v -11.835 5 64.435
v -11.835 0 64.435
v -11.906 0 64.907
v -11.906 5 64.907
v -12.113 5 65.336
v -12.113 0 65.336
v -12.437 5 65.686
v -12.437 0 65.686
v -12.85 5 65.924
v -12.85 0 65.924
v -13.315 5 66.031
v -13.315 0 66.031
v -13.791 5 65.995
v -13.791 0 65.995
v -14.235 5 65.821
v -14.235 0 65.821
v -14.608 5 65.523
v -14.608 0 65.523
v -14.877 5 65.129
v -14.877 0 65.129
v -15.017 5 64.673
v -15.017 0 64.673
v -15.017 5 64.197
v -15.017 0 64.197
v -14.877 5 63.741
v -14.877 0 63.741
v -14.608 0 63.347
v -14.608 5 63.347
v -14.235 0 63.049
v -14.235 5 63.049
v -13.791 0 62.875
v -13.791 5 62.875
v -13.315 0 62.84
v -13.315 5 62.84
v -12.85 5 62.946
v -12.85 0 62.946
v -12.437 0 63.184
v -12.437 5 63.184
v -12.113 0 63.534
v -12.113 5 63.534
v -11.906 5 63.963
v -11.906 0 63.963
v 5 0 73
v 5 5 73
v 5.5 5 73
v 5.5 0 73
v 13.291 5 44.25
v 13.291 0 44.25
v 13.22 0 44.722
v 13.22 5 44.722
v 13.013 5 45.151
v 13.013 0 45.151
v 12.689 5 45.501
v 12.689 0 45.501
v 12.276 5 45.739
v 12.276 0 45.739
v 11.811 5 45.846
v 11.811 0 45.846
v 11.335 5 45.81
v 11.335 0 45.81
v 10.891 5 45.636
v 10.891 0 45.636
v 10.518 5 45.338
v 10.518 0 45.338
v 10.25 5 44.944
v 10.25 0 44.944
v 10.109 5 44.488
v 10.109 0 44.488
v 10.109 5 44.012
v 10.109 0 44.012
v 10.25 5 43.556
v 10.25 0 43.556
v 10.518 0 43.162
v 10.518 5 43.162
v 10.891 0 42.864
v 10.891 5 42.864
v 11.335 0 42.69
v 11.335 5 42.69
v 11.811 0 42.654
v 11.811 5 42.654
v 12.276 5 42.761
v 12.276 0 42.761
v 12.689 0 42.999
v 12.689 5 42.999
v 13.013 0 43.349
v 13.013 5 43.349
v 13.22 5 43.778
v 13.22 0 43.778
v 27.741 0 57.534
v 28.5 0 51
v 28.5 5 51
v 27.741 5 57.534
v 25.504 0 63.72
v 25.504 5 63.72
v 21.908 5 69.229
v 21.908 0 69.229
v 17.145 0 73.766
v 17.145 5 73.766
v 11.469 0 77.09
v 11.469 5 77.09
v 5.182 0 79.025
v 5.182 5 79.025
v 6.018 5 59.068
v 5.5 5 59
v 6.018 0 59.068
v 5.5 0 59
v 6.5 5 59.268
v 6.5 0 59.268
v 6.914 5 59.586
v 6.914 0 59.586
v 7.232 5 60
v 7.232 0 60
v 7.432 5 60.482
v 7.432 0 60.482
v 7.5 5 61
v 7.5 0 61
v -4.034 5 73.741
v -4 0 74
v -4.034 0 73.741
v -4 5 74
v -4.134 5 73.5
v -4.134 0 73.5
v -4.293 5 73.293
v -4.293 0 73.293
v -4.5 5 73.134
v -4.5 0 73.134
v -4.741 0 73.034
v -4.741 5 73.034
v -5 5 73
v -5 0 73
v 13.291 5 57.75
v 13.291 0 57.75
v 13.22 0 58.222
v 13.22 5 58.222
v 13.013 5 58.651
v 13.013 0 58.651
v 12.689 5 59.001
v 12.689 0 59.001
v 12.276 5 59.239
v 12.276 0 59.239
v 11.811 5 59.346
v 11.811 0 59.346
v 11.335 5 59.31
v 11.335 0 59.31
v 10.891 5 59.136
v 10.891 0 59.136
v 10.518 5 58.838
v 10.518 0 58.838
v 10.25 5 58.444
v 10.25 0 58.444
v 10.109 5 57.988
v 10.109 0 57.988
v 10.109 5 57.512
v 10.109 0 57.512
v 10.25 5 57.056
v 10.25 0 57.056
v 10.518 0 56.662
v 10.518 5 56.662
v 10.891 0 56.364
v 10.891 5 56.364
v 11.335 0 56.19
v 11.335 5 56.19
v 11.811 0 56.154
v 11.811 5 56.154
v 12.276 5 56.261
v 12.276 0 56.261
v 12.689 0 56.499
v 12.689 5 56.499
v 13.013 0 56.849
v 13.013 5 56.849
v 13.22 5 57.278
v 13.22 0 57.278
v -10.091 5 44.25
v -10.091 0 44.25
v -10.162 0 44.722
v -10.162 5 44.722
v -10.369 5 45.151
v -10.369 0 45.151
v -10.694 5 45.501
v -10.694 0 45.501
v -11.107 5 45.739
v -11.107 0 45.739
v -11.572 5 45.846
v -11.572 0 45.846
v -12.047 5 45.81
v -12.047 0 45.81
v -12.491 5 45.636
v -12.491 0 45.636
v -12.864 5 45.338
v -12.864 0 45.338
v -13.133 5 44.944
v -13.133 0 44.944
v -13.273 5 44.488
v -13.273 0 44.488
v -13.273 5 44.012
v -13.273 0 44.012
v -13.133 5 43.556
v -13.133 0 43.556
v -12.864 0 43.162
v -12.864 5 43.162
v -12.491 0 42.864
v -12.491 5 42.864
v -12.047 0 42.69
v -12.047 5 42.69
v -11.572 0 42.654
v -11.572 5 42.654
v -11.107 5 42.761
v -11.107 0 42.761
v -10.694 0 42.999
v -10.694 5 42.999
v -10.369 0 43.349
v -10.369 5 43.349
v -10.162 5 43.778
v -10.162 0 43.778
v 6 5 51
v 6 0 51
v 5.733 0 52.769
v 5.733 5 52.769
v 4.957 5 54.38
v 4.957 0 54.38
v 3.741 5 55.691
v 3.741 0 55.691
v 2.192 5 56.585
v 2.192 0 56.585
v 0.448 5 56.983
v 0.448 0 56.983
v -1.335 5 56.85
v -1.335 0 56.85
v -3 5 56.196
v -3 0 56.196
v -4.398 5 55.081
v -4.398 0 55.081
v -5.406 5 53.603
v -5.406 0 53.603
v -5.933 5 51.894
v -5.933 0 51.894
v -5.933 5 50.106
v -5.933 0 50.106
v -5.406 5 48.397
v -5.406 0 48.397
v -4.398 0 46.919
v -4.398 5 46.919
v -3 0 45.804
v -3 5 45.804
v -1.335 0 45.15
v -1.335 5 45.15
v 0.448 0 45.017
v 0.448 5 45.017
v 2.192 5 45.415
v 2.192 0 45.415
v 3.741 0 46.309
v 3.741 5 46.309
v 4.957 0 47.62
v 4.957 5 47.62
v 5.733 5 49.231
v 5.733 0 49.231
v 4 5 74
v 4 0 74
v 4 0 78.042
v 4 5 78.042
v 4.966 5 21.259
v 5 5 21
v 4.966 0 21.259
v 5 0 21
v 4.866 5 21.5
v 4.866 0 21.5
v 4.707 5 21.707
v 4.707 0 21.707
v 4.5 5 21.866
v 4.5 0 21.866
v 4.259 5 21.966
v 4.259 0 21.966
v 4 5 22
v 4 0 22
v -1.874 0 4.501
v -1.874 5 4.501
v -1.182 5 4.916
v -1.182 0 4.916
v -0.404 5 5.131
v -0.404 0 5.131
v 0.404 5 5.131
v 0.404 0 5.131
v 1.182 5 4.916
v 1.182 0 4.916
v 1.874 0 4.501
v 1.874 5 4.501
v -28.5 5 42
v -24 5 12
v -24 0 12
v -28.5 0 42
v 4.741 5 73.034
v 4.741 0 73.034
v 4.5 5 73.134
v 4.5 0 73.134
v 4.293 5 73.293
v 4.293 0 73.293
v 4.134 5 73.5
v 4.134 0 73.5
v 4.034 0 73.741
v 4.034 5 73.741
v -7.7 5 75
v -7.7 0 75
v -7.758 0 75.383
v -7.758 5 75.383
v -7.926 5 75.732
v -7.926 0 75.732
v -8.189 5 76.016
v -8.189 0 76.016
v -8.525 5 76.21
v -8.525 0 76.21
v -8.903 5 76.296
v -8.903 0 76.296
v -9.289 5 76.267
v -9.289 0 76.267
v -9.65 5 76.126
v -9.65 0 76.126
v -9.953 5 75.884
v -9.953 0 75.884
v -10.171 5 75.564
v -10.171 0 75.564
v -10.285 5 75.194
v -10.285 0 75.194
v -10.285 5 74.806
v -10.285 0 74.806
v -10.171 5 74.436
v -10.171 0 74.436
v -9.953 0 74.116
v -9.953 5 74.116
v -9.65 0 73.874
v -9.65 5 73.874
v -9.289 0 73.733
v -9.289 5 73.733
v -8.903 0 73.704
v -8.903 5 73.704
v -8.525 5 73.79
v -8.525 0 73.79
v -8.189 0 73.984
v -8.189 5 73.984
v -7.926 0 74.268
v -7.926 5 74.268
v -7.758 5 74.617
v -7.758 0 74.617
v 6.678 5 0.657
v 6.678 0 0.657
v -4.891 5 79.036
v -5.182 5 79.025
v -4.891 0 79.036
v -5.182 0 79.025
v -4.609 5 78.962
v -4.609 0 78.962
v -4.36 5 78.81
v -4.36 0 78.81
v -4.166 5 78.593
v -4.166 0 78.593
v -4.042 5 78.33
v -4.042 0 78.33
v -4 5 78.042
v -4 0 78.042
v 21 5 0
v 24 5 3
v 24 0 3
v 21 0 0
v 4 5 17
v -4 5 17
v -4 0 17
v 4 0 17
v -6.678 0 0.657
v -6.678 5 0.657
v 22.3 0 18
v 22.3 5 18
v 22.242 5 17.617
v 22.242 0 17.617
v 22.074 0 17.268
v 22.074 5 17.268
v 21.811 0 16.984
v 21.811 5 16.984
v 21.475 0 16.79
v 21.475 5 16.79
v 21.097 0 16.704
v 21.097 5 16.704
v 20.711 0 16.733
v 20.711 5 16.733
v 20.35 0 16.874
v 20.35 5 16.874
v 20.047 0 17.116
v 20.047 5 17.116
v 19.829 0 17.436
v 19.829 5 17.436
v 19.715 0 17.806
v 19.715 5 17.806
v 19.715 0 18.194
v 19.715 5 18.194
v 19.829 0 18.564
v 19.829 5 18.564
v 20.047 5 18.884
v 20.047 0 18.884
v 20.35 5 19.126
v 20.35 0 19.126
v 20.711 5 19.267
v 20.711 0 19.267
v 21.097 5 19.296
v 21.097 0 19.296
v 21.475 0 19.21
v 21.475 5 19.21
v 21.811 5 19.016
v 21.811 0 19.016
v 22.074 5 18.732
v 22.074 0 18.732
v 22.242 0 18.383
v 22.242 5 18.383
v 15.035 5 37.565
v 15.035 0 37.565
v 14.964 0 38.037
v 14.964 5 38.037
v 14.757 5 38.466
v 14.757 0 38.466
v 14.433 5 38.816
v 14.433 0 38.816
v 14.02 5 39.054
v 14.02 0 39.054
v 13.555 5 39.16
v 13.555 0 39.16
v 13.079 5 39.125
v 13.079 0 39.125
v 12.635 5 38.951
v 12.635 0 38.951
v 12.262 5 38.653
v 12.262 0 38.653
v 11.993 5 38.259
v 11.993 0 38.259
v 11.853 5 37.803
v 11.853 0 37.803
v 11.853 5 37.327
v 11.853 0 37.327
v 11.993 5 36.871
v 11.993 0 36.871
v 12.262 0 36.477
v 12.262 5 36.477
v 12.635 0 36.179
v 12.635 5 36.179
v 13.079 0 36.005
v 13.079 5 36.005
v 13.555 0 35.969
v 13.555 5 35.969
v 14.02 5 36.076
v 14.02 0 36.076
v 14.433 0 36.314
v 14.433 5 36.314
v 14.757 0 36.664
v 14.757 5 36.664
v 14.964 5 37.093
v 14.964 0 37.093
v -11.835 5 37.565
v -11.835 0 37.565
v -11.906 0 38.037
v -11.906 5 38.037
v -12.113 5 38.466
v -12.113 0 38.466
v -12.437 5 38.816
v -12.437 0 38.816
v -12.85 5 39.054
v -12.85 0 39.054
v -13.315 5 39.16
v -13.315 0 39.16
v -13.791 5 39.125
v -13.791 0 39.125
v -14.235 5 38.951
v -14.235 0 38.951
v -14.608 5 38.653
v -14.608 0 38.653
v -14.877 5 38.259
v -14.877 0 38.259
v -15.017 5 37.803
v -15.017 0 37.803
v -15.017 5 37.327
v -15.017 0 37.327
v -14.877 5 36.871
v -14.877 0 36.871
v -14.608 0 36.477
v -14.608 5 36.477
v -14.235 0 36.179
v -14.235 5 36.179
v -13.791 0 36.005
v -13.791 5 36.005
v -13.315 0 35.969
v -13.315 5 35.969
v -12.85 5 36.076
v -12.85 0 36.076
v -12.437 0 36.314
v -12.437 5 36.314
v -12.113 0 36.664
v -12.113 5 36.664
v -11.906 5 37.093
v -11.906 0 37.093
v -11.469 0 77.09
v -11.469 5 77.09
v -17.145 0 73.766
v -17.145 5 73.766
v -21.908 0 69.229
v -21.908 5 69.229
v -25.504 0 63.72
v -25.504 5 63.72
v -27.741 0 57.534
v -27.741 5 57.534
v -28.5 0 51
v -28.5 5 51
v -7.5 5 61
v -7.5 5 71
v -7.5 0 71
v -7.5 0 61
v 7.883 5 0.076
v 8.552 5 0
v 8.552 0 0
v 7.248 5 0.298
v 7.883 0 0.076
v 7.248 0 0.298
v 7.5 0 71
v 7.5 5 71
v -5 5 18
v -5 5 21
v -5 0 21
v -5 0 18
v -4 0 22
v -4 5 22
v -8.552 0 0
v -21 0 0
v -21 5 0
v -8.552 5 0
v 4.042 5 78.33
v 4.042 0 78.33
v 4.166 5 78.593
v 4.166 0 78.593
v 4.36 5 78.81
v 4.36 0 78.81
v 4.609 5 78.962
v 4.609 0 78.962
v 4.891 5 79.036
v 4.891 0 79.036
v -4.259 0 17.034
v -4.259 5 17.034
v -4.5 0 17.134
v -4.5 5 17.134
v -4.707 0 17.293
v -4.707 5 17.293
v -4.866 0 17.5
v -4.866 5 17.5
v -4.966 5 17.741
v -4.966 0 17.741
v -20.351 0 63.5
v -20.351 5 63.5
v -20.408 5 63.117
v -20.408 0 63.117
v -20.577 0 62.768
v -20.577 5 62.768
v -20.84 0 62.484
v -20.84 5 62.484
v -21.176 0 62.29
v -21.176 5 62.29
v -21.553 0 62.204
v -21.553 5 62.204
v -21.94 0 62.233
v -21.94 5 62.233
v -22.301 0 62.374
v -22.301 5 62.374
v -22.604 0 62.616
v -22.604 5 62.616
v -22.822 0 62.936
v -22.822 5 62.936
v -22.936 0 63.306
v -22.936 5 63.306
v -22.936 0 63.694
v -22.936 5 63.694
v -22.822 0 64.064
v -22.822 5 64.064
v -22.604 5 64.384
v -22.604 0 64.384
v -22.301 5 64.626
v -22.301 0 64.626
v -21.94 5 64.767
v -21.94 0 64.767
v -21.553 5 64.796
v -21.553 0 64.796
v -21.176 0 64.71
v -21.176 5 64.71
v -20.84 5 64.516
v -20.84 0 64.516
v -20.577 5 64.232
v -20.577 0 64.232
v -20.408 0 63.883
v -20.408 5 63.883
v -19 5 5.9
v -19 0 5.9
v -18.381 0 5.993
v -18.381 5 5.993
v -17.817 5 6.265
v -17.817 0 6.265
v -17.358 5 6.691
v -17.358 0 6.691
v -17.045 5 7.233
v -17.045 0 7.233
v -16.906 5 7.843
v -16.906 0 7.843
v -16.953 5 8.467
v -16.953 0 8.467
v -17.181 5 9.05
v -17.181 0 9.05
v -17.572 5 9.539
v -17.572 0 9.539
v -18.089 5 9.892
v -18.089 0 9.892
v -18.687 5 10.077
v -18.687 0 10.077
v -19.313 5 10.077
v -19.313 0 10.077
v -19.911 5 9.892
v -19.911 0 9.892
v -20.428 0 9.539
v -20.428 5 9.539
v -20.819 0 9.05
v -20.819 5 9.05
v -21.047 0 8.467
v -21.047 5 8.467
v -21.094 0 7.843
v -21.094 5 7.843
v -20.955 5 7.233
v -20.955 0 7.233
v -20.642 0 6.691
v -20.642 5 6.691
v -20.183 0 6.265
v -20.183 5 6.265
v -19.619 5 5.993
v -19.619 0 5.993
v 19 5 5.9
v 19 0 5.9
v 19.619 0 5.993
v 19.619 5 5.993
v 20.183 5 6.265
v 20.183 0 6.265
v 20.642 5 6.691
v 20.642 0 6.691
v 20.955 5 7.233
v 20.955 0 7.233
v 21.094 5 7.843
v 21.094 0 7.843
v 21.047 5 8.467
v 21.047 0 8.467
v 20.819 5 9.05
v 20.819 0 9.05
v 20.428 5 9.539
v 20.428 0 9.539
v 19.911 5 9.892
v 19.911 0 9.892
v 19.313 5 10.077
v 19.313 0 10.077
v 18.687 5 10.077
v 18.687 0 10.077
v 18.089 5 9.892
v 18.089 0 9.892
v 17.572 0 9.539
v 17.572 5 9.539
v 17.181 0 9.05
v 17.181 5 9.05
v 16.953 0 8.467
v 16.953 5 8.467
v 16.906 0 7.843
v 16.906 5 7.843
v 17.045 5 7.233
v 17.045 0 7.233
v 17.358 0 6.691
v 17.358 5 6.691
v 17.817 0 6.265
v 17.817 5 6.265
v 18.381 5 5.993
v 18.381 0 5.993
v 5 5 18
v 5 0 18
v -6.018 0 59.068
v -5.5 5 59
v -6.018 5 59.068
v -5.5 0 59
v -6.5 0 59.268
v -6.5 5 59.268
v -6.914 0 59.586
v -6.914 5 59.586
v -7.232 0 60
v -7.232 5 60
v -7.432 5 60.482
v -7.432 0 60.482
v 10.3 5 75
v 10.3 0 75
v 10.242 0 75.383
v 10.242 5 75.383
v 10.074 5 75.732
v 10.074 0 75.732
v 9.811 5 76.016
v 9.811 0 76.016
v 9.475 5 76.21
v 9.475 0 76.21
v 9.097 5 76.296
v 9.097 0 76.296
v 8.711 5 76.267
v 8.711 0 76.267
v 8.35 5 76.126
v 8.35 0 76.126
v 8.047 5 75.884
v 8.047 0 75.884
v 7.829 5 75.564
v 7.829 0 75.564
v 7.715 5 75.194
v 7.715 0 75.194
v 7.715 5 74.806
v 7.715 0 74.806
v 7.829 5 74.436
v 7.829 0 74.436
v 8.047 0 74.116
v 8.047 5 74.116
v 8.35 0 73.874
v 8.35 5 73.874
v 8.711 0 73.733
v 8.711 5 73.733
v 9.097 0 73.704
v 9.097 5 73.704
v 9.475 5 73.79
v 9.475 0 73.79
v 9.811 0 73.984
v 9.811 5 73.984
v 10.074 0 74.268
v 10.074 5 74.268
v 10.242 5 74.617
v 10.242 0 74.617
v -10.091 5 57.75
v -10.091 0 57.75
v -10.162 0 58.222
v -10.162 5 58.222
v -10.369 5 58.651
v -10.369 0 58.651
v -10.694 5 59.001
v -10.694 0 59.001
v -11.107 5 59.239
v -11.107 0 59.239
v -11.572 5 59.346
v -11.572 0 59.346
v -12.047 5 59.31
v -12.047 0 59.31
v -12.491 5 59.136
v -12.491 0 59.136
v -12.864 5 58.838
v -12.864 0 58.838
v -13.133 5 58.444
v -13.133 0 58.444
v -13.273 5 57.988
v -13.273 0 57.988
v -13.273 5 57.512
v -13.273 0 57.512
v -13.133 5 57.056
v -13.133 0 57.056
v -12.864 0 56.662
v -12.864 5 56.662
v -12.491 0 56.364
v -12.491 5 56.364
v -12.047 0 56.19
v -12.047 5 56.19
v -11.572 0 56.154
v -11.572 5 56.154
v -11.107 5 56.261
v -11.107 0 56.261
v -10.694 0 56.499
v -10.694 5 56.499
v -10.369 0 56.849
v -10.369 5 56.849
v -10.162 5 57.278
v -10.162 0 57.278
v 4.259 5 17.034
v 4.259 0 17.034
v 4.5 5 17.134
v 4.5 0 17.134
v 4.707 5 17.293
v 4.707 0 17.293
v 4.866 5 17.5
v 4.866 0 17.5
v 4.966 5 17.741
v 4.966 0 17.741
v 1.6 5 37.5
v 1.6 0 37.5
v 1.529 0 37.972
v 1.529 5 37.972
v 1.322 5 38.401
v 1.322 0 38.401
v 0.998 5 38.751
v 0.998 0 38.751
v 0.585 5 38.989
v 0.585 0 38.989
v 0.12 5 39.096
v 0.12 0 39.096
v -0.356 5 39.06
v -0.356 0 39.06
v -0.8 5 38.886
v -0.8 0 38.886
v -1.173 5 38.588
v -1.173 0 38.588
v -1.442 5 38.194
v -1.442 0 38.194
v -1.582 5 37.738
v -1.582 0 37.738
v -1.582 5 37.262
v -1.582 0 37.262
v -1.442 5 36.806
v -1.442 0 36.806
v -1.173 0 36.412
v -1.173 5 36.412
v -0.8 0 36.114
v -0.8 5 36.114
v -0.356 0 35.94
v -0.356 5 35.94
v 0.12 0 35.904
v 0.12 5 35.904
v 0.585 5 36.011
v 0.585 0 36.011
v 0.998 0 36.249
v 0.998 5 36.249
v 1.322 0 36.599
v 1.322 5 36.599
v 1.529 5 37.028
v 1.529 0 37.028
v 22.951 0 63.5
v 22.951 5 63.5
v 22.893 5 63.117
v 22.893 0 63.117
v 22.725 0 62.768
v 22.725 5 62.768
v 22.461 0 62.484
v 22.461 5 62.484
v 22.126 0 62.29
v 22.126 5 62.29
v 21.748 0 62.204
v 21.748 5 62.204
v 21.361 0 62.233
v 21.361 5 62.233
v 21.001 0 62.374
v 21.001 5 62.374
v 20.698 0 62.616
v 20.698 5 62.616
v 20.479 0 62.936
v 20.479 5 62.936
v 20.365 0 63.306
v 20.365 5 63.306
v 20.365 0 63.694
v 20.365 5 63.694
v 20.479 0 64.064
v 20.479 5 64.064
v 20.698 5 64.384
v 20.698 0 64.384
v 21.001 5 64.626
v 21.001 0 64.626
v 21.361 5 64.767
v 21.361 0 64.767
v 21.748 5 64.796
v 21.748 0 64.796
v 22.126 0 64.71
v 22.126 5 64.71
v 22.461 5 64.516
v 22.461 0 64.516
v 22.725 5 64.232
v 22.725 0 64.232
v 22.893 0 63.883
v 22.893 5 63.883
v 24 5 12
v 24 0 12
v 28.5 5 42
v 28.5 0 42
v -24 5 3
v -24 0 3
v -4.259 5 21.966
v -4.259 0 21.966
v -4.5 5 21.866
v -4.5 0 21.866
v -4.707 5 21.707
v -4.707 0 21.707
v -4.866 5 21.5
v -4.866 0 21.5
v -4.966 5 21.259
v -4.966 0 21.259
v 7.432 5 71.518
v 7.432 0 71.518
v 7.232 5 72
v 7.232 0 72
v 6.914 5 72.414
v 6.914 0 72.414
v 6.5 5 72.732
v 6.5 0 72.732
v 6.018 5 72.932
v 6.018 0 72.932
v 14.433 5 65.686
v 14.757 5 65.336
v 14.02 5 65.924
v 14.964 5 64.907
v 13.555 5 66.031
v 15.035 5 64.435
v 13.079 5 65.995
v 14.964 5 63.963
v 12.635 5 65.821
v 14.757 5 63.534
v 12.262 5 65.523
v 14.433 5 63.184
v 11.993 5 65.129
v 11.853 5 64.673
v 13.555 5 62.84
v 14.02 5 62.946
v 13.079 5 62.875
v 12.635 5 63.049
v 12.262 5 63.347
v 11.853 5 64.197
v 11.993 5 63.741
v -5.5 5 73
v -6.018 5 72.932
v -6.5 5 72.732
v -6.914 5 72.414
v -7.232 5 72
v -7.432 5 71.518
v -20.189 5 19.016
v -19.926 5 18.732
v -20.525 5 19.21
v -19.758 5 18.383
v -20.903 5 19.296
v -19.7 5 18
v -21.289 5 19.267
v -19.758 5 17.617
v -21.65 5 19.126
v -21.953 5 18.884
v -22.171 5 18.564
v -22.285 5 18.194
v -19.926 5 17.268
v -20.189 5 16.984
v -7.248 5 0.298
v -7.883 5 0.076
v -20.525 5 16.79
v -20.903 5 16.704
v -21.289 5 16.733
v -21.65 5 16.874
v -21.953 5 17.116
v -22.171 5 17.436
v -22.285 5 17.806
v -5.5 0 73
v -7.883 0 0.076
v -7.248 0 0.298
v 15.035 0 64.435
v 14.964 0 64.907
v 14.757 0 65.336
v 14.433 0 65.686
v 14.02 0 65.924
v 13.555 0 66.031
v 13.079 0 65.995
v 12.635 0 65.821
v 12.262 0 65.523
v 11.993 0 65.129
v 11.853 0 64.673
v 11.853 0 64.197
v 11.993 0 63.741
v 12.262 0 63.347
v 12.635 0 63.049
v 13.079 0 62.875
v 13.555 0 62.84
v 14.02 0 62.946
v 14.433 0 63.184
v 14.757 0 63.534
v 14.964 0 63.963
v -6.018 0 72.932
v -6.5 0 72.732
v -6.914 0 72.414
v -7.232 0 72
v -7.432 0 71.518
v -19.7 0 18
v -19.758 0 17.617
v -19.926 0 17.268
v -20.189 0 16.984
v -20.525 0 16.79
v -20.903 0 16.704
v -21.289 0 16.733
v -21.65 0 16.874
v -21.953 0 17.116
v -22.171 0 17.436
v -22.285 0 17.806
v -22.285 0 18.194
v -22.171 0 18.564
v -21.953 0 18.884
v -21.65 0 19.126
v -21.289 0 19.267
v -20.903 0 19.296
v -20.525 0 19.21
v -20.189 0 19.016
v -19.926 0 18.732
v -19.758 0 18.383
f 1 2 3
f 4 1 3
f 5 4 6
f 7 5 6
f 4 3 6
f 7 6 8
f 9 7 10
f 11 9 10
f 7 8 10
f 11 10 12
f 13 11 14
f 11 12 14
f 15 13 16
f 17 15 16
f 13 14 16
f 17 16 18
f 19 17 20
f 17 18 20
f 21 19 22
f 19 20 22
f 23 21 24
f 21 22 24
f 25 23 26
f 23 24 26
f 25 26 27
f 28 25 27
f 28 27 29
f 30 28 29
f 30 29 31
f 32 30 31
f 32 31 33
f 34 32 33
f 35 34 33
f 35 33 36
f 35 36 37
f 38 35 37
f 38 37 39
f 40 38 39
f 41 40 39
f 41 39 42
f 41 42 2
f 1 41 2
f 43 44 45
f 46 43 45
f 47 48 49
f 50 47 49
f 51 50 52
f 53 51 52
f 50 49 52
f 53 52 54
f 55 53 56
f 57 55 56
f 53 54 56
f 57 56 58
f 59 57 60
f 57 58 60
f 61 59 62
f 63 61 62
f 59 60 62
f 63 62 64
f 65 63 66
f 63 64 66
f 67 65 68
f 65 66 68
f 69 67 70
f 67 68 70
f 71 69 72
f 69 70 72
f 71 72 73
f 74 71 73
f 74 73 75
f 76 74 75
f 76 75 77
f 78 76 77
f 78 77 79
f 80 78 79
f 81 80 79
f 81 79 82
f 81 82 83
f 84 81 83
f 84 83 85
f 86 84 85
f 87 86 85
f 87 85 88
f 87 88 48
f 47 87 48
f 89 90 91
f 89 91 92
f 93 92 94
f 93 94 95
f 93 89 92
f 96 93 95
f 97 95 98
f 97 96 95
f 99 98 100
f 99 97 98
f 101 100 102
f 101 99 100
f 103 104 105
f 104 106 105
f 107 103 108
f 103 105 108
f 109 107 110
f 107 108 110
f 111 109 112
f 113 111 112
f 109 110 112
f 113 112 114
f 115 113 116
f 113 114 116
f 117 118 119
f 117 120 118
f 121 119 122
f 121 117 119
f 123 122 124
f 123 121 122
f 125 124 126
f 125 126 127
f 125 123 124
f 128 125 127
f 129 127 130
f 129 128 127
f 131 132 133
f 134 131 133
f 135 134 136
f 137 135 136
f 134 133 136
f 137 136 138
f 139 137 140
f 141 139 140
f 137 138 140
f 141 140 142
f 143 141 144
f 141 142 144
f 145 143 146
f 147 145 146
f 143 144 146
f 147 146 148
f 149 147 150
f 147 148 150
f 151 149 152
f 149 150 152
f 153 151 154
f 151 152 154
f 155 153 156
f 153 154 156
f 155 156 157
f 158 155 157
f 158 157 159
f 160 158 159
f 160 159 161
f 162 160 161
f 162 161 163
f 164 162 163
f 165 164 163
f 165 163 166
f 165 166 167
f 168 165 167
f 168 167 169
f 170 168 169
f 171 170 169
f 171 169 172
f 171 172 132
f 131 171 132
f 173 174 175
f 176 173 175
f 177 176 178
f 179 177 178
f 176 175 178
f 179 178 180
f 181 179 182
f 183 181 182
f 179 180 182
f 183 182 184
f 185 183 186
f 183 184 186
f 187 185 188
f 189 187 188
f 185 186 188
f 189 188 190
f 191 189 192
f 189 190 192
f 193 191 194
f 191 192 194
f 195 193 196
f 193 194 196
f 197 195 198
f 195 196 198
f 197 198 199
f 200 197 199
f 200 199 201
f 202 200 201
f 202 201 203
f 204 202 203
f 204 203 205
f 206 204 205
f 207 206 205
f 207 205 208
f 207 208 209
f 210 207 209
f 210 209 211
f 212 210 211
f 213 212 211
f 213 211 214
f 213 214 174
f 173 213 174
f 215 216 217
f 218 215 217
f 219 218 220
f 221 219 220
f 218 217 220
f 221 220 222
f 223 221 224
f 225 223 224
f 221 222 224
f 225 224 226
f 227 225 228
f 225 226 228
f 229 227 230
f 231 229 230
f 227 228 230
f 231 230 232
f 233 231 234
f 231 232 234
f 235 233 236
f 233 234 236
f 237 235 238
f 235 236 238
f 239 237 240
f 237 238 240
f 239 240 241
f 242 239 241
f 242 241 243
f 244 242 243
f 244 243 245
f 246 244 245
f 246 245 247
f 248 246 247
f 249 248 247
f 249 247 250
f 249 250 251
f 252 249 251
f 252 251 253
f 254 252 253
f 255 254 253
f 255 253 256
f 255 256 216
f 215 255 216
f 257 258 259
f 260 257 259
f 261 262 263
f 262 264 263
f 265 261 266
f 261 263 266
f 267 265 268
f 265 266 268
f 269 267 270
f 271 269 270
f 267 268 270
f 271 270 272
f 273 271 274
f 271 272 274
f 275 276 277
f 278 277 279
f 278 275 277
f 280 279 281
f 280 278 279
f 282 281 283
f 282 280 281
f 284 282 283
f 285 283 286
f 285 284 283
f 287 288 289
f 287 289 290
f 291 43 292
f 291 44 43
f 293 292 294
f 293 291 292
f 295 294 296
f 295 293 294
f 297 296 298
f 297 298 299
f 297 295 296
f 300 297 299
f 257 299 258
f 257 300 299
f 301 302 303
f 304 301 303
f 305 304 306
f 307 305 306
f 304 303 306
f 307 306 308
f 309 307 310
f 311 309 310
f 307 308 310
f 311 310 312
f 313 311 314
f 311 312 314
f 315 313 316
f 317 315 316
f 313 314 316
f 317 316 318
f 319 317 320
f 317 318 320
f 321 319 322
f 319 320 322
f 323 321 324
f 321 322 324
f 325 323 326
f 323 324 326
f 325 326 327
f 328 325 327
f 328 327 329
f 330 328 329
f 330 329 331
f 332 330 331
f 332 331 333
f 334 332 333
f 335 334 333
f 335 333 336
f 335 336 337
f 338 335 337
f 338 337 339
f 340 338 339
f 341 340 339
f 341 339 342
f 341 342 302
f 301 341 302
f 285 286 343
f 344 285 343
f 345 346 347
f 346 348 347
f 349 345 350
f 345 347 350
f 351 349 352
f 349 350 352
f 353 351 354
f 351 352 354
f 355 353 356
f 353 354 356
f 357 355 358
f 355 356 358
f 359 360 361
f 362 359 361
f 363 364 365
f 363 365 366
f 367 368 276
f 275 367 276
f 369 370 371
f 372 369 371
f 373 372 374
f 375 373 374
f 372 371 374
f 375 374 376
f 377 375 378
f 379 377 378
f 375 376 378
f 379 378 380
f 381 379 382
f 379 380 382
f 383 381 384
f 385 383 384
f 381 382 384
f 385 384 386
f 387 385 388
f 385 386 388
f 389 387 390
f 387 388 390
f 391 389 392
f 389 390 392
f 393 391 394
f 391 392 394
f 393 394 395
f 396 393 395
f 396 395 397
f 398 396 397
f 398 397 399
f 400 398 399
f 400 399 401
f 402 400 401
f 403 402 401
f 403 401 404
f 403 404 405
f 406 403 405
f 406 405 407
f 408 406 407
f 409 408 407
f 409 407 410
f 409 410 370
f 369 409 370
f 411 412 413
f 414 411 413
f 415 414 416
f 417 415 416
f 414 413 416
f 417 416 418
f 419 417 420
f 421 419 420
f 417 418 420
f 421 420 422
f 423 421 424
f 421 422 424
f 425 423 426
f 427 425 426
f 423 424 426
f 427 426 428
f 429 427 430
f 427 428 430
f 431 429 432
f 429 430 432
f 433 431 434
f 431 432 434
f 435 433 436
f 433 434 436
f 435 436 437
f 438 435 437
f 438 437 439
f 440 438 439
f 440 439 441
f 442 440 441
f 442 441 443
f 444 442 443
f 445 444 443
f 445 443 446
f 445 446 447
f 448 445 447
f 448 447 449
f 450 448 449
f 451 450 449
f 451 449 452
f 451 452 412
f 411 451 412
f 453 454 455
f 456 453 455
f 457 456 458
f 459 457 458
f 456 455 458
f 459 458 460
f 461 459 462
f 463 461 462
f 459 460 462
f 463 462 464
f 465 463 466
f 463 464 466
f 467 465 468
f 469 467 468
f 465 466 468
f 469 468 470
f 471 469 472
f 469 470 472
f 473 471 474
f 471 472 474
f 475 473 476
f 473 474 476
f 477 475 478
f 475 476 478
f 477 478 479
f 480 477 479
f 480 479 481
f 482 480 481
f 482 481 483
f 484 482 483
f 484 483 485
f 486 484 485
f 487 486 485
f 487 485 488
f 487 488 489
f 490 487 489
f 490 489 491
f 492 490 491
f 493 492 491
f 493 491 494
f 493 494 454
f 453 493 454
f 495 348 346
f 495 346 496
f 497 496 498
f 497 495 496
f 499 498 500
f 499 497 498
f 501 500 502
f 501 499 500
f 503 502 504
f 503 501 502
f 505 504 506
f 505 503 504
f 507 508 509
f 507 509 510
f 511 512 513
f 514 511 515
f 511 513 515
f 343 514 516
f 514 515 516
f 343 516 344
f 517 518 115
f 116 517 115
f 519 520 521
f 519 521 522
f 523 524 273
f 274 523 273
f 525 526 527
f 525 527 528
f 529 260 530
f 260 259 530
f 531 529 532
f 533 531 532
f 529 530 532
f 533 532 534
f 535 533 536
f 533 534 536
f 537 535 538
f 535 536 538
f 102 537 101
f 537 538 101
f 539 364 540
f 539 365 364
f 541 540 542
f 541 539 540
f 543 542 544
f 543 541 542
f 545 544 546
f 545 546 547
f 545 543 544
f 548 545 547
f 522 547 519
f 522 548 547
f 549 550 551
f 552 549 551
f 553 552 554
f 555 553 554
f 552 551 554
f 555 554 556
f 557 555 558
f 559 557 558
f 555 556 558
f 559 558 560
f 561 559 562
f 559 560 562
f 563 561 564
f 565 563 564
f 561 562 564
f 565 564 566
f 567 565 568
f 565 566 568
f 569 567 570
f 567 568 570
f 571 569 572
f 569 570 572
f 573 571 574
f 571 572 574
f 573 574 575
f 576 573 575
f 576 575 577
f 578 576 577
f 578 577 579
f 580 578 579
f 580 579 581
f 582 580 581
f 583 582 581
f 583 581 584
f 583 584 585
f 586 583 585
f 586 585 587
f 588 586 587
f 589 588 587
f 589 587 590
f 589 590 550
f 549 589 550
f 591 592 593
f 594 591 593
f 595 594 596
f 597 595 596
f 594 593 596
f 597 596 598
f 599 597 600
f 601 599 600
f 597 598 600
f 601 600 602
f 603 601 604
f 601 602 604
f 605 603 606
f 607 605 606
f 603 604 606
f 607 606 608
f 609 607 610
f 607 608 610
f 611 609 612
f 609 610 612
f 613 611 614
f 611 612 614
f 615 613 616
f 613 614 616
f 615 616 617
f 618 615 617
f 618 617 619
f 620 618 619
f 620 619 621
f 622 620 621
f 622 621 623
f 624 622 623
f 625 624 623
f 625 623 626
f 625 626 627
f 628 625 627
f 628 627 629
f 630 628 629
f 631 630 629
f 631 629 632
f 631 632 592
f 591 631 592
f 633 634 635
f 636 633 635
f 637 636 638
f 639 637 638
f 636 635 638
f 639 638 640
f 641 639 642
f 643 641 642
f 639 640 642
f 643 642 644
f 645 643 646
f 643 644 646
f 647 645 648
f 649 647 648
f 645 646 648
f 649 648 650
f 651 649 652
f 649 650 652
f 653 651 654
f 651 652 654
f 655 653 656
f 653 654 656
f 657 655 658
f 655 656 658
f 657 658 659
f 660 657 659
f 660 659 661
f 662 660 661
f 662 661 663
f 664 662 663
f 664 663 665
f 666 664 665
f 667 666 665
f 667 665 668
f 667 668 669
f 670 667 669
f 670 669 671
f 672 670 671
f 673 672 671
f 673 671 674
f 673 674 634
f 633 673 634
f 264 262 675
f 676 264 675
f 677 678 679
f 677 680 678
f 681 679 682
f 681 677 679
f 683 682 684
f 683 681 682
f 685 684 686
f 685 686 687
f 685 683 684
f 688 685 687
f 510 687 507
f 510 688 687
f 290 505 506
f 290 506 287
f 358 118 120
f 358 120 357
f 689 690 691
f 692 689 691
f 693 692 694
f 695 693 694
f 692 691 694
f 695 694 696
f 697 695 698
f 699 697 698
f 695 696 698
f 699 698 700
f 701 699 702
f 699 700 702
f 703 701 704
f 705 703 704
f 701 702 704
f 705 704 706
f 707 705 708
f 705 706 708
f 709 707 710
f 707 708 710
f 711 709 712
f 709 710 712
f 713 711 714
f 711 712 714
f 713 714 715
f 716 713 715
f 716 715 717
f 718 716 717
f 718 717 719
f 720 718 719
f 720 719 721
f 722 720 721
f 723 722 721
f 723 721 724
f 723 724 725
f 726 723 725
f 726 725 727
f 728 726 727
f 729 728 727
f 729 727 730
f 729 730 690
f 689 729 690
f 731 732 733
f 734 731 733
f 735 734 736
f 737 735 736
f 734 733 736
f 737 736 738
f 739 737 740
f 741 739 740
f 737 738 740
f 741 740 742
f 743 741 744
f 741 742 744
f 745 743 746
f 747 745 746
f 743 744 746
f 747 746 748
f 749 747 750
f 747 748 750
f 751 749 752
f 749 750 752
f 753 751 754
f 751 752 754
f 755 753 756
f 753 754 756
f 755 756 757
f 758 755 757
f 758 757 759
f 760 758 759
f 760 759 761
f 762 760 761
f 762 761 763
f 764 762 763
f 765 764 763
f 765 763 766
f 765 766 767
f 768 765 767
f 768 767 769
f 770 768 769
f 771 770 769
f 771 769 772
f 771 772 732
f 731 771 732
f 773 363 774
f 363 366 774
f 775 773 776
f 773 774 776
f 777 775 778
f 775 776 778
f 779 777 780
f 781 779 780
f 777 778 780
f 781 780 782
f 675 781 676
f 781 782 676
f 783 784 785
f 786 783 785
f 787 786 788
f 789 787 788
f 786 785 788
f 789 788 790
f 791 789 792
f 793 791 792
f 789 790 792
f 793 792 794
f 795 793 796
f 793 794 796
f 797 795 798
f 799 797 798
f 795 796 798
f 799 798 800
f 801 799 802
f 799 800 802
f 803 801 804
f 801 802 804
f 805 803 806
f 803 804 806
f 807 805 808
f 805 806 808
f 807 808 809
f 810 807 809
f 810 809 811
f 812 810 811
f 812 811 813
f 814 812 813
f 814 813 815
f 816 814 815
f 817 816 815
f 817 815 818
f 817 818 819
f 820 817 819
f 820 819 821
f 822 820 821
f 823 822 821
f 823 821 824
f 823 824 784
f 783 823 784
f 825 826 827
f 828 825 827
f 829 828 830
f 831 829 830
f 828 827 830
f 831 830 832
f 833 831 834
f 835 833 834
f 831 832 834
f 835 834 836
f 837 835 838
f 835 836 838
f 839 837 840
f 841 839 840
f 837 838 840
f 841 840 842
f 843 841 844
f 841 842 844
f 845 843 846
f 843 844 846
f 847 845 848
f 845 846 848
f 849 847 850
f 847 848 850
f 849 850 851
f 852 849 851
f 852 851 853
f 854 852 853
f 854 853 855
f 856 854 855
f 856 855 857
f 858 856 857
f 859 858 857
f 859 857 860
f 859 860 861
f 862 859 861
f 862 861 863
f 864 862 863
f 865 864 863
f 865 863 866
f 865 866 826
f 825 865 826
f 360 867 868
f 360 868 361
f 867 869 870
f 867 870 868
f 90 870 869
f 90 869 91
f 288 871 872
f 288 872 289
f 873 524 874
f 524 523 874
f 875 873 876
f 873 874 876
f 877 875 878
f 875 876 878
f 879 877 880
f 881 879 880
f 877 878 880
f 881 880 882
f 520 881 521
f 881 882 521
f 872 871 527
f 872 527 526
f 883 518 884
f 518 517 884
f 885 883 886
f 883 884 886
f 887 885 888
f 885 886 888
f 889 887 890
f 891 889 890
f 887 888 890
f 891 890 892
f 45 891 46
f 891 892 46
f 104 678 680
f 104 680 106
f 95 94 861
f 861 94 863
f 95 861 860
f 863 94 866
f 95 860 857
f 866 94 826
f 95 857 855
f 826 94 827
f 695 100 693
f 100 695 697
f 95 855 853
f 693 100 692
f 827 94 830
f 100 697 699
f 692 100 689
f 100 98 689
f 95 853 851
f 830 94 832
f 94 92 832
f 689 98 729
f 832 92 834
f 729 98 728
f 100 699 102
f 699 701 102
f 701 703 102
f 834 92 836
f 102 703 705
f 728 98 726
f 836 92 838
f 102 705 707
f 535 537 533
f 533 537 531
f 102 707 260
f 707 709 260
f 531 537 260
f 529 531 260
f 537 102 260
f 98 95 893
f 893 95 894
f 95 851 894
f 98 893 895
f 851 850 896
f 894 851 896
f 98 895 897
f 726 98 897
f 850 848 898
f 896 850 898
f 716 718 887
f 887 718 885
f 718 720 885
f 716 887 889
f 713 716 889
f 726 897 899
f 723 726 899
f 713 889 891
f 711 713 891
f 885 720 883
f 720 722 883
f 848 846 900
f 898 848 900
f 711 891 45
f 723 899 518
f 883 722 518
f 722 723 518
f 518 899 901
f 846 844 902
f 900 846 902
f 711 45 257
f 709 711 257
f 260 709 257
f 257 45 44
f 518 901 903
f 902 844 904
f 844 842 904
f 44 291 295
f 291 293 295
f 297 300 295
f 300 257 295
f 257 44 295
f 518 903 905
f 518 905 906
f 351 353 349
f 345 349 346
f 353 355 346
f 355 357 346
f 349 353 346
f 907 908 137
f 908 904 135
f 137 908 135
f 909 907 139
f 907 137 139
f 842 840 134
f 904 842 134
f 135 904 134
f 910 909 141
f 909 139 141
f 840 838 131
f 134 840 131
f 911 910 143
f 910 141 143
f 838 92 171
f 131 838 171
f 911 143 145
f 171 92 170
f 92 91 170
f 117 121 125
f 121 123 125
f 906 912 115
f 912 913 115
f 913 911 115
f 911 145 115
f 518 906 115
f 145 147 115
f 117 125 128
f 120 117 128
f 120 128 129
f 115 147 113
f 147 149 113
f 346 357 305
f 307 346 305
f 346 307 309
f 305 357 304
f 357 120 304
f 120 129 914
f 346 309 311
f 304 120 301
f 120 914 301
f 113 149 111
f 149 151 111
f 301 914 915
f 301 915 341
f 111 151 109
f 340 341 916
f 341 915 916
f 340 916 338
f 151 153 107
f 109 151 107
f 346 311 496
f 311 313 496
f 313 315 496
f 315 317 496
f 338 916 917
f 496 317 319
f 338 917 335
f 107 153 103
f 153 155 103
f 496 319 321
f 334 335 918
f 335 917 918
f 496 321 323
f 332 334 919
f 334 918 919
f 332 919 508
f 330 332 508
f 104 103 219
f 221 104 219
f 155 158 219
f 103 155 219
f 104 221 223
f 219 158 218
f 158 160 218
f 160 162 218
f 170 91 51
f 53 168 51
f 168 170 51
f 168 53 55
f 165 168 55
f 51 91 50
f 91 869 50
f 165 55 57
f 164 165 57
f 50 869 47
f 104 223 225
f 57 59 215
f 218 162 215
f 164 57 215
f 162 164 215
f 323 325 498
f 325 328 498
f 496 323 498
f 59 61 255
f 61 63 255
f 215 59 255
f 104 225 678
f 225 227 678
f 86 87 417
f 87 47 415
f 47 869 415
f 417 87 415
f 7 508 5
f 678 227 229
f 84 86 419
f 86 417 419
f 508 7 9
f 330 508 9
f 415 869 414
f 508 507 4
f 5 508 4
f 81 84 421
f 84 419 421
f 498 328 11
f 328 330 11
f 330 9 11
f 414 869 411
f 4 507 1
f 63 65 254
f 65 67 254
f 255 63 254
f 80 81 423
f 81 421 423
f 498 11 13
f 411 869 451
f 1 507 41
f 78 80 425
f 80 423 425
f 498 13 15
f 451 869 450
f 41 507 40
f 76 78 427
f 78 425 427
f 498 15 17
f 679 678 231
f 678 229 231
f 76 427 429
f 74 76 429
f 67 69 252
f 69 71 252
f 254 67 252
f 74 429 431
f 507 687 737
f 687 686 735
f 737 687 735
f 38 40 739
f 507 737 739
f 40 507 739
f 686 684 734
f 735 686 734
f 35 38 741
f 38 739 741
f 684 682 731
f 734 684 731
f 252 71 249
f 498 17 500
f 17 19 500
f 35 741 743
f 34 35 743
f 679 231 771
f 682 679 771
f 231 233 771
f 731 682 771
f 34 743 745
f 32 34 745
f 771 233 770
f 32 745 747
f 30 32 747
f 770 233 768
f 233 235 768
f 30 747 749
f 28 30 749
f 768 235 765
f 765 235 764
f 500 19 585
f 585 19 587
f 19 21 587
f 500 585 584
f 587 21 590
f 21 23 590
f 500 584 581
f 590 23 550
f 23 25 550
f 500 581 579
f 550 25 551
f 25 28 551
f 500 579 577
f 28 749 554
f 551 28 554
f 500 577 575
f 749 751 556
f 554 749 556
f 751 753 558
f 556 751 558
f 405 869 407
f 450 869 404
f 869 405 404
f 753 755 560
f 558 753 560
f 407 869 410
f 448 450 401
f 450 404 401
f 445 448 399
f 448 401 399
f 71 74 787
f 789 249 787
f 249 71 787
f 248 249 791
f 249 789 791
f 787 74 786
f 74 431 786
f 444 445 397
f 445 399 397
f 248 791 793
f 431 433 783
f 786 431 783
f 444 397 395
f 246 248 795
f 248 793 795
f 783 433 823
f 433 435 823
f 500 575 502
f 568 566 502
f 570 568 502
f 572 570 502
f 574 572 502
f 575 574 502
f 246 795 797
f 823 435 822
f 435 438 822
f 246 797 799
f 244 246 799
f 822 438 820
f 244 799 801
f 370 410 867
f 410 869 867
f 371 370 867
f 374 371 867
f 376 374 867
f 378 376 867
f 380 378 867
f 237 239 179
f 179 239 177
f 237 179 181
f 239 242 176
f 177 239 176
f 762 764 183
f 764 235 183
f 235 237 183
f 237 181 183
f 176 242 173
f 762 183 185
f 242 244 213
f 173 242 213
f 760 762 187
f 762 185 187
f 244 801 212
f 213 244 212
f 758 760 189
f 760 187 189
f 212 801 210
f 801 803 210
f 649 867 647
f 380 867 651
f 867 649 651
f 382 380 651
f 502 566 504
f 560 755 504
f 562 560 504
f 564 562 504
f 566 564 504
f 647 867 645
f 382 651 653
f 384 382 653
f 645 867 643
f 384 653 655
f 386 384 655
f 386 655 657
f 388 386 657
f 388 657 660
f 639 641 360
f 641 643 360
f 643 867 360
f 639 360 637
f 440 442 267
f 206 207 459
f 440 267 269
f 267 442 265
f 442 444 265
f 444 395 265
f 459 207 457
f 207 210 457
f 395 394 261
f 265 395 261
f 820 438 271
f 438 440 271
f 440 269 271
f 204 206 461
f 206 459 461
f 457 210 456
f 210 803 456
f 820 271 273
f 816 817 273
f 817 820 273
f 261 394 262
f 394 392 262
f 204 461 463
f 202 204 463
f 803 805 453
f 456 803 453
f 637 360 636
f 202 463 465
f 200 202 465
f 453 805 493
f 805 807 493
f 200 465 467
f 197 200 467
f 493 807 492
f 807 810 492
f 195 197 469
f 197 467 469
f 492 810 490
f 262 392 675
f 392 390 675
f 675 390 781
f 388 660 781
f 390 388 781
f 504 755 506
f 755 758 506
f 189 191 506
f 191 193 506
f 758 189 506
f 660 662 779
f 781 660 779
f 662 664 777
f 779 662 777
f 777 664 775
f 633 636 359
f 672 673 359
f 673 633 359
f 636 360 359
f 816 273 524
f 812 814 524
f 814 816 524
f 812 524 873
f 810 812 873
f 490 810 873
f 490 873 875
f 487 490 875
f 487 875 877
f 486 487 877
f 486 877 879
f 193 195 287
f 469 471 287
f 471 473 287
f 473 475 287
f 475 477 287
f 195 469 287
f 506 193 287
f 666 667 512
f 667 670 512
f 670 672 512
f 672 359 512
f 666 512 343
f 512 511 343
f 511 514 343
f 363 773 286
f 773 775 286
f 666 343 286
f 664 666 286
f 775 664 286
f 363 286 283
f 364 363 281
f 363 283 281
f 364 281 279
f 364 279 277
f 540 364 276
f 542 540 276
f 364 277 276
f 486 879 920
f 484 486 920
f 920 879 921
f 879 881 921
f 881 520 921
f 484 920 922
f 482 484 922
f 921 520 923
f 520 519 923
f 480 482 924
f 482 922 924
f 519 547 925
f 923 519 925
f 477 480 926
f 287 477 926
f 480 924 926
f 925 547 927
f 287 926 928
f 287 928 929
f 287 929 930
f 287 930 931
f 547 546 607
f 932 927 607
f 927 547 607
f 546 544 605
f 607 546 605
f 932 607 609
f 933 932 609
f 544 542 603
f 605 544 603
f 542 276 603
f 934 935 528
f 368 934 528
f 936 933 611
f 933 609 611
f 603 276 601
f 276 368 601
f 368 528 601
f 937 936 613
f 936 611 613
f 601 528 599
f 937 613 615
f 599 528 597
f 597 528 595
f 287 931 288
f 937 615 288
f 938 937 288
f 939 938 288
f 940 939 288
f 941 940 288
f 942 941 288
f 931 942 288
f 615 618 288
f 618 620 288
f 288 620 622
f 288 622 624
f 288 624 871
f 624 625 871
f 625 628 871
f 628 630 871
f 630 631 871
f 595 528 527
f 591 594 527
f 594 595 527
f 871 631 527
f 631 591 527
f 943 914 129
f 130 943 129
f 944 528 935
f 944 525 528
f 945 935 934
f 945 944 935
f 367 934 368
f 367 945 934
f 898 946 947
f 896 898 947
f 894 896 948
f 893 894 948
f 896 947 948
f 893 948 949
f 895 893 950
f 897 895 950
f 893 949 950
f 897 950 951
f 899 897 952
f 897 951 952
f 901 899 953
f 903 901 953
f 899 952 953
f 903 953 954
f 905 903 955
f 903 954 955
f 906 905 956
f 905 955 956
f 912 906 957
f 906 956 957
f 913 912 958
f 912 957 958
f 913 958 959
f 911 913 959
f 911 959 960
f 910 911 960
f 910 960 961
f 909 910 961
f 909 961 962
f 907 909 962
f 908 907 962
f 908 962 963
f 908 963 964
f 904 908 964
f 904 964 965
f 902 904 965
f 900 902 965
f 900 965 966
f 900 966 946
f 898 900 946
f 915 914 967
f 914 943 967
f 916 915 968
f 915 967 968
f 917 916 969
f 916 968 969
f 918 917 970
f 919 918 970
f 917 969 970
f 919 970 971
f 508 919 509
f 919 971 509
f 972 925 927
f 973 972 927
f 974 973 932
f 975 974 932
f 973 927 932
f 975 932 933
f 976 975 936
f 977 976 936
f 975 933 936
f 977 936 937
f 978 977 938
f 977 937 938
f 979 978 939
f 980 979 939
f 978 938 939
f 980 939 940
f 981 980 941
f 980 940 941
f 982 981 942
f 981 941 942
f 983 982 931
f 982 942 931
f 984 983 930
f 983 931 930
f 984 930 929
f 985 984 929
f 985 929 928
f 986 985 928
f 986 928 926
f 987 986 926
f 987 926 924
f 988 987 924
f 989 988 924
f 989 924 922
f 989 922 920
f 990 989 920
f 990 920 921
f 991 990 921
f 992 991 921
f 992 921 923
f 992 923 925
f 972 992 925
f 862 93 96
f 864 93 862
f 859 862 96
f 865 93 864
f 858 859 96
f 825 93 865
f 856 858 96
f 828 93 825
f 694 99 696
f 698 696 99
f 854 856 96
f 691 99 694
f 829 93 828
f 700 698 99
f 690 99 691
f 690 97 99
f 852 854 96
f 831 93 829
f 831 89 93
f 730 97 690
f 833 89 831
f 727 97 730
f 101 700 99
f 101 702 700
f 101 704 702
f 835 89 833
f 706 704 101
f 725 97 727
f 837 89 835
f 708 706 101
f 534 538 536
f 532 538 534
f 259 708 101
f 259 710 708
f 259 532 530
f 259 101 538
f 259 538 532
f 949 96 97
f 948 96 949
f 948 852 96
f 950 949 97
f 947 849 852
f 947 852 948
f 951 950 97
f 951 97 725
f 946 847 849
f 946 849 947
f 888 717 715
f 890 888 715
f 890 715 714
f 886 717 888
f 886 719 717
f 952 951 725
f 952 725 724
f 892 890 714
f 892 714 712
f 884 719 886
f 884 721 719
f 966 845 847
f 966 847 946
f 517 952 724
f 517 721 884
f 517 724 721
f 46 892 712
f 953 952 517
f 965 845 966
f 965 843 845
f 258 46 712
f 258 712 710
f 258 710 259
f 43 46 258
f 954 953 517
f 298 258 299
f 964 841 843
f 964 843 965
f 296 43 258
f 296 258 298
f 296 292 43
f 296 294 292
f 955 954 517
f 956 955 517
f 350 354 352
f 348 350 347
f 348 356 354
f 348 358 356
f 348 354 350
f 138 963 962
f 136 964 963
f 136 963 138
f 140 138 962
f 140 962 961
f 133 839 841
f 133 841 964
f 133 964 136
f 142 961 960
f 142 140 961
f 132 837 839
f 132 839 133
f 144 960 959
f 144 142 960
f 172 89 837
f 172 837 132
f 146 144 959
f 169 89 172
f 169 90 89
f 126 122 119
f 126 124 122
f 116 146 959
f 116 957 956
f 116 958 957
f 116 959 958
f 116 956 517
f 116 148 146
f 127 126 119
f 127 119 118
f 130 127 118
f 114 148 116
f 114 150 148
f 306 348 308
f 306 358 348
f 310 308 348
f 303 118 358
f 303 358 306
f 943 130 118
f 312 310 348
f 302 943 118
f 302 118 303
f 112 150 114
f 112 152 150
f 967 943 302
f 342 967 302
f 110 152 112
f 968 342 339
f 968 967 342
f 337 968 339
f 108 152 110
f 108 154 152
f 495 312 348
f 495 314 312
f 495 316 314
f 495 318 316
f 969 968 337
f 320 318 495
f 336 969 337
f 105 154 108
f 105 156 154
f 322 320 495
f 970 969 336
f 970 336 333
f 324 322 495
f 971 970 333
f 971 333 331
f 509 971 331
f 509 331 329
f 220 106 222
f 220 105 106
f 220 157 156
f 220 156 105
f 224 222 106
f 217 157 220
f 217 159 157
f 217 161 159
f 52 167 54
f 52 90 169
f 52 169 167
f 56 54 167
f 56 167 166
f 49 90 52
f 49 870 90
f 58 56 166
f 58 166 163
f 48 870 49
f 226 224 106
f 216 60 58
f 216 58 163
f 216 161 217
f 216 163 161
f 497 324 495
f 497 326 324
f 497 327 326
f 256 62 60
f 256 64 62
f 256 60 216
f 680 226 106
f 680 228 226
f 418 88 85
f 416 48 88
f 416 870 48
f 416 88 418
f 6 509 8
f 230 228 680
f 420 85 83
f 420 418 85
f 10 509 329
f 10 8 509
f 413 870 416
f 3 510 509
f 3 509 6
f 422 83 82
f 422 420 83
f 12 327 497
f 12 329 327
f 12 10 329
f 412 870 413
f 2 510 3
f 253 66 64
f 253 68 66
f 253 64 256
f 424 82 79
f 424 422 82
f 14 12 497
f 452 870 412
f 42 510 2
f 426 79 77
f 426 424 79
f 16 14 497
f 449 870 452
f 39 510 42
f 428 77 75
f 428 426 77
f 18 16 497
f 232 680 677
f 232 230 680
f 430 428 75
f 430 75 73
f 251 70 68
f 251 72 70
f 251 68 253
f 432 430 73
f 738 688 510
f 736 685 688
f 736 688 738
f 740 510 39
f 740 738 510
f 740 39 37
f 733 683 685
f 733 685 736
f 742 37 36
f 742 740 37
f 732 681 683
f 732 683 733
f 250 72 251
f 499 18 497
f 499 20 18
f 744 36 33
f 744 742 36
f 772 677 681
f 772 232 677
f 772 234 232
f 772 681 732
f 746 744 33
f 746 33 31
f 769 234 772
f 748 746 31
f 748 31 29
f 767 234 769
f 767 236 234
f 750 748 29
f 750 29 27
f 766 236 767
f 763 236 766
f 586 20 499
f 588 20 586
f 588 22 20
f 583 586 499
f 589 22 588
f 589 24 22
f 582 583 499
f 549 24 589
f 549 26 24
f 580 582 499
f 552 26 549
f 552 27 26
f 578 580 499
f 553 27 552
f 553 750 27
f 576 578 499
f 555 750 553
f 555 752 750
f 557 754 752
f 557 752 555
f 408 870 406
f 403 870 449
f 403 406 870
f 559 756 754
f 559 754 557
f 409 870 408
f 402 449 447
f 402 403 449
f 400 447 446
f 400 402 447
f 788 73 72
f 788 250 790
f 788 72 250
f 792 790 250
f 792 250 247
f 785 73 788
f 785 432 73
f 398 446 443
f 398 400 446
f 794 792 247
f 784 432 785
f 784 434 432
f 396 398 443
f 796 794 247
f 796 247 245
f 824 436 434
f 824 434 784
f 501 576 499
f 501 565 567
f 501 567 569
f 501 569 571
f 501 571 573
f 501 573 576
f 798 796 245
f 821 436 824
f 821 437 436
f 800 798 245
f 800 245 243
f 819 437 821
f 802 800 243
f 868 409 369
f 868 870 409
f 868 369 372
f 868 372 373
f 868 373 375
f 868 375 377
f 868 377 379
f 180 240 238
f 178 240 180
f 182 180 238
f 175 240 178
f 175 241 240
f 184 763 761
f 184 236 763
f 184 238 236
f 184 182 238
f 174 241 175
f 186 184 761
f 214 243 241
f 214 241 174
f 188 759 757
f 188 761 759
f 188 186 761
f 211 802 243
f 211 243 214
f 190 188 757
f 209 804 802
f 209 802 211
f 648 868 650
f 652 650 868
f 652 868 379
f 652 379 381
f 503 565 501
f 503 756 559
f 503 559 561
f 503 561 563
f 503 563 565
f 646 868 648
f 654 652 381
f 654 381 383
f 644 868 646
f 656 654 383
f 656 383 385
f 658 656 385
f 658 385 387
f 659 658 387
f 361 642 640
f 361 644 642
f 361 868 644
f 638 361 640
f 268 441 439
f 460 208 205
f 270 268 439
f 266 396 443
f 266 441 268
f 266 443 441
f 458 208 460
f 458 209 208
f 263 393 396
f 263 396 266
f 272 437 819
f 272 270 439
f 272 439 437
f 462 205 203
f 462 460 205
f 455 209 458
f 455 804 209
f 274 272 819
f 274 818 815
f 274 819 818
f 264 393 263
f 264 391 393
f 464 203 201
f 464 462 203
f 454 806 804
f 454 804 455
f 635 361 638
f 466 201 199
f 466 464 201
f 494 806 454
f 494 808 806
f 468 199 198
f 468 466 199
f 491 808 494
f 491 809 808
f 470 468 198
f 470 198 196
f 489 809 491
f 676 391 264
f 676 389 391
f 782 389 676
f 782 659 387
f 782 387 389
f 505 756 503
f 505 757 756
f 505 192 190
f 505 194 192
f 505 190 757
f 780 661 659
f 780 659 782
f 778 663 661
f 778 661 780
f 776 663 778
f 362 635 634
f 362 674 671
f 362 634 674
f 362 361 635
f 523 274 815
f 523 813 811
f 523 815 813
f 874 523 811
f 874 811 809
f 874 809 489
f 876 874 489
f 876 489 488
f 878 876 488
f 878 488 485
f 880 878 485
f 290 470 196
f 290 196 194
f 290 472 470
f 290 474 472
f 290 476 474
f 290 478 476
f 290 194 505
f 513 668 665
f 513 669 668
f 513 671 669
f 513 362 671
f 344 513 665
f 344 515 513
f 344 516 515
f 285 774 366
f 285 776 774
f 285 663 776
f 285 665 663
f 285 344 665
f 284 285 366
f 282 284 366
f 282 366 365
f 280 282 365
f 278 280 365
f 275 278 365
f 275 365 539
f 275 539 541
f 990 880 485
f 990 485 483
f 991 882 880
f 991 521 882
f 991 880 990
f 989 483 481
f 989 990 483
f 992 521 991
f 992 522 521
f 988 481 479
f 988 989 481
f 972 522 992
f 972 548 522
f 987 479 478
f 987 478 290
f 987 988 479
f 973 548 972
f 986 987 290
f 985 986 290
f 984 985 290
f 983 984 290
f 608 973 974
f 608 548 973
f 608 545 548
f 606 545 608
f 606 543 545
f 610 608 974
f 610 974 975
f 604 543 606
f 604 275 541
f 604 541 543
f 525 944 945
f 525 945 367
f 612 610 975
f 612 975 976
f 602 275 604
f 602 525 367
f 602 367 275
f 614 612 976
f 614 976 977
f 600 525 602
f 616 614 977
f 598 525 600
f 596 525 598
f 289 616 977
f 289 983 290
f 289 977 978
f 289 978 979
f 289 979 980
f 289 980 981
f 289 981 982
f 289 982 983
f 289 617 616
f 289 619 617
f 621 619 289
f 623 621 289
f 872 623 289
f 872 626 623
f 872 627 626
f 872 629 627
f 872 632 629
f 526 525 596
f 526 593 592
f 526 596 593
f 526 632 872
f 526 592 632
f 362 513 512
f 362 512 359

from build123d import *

# Parameters (mm, degrees)
EXTRUDE_1_DEPTH        = 5
HOLE_WIZARD_M5_1_D     = 4.2
HOLE_WIZARD_M5_1_DEPTH = 5
SKETCH_4_R             = 1.6
CUT_EXTRUDE_1_DEPTH    = 10
SKETCH_5_R             = 1.6
CUT_EXTRUDE_2_DEPTH    = 10
SKETCH_6_R             = 6
CUT_EXTRUDE_3_DEPTH    = 10
CHAMFER_1_SIZE         = 2
CUT_EXTRUDE_4_DEPTH    = 6
CHAMFER_2_SIZE         = 3
SKETCH_8_R             = 1.3
CUT_EXTRUDE_5_DEPTH    = 6
SKETCH_9_R             = 1.3
CUT_EXTRUDE_6_DEPTH    = 6
CUT_EXTRUDE_8_DEPTH    = 10
FILLET_1_R             = 3
SKETCH_12_W            = 15
SKETCH_12_H            = 14
CUT_EXTRUDE_9_DEPTH    = 10
FILLET_2_R             = 2
SKETCH_13_W            = 8
SKETCH_13_H            = 6.5
CUT_EXTRUDE_10_DEPTH   = 10
FILLET_3_R             = 1
SKETCH_14_R            = 1.3
CUT_EXTRUDE_11_DEPTH   = 10
SKETCH_15_W            = 10
SKETCH_15_H            = 5
CUT_EXTRUDE_12_DEPTH   = 10
FILLET_4_R             = 1


with BuildPart() as part:
    # 草图1 → 凸台-拉伸1 (new body)
    with BuildSketch(Plane(origin=(0, 0, 0), x_dir=(1, 0, 0), z_dir=(0, 1, 0))):
        with BuildLine():
            Line((-28.5, 0), (28.5, 0))
            Line((28.5, 0), (28.5, -51))
            ThreePointArc((28.5, -51), (0, -79.5), (-28.5, -51))
            Line((-28.5, -51), (-28.5, 0))
        make_face()
    extrude(amount=EXTRUDE_1_DEPTH)

    # M5 螺纹孔1
    with Locations(Plane(origin=(19, 5, 8), x_dir=(0, 0, 1), z_dir=(0, 1, 0))):
        with Locations((0, 0), (0, -38)):
            Hole(HOLE_WIZARD_M5_1_D / 2, depth=HOLE_WIZARD_M5_1_DEPTH)

    # 草图4 → 切除-拉伸1 (cut)
    with BuildSketch(Plane.XZ):
        with Locations((-13.435028843, 64.435028843)):
            Circle(SKETCH_4_R)
        with Locations((13.435028843, 64.435028843)):
            Circle(SKETCH_4_R)
        with Locations((13.435028843, 37.564971157)):
            Circle(SKETCH_4_R)
        with Locations((-13.435028843, 37.564971157)):
            Circle(SKETCH_4_R)
    extrude(amount=-CUT_EXTRUDE_1_DEPTH, mode=Mode.SUBTRACT)

    # 草图5 → 切除-拉伸2 (cut)
    with BuildSketch(Plane.XZ):
        with Locations((0, 64.5)):
            Circle(SKETCH_5_R)
        with Locations((11.691342951, 57.75)):
            Circle(SKETCH_5_R)
        with Locations((11.691342951, 44.25)):
            Circle(SKETCH_5_R)
        with Locations((0, 37.5)):
            Circle(SKETCH_5_R)
        with Locations((-11.691342951, 44.25)):
            Circle(SKETCH_5_R)
        with Locations((-11.691342951, 57.75)):
            Circle(SKETCH_5_R)
    extrude(amount=-CUT_EXTRUDE_2_DEPTH, mode=Mode.SUBTRACT)

    # 草图6 → 切除-拉伸3 (cut)
    with BuildSketch(Plane.XZ):
        with Locations((0, 51)):
            Circle(SKETCH_6_R)
    extrude(amount=-CUT_EXTRUDE_3_DEPTH, mode=Mode.SUBTRACT)

    # 倒角1
    chamfer_1_edges = [part.edges().sort_by_distance(p)[0] for p in [
        (-28.5, 2.5, 0),
        (28.5, 2.5, 0),
    ]]
    chamfer(chamfer_1_edges, length=CHAMFER_1_SIZE)

    # 草图7 → 切除-拉伸4 (cut, through all)
    with BuildSketch(Plane(origin=(0, 5, 0), x_dir=(1, 0, 0), z_dir=(0, 1, 0))):
        Polygon((-24, 0), (-24, -12), (-28.5, -42), (-28.5, -2), (-26.5, 0), align=None)
        Polygon((28.5, -2), (28.5, -42), (24, -12), (24, 0), (26.5, 0), align=None)
    extrude(amount=-CUT_EXTRUDE_4_DEPTH, mode=Mode.SUBTRACT)

    # 倒角2
    chamfer_2_edges = [part.edges().sort_by_distance(p)[0] for p in [
        (-24, 2.5, 0),
        (24, 2.5, 0),
    ]]
    chamfer(chamfer_2_edges, length=CHAMFER_2_SIZE)

    # 草图8 → 切除-拉伸5 (cut, through all)
    with BuildSketch(Plane(origin=(0, 5, 0), x_dir=(1, 0, 0), z_dir=(0, 1, 0))):
        with Locations((-21.650635095, -63.5)):
            Circle(SKETCH_8_R)
        with Locations((21.650635095, -63.5)):
            Circle(SKETCH_8_R)
    extrude(amount=-CUT_EXTRUDE_5_DEPTH, mode=Mode.SUBTRACT)

    # 草图9 → 切除-拉伸6 (cut, through all)
    with BuildSketch(Plane(origin=(0, 5, 0), x_dir=(1, 0, 0), z_dir=(0, 1, 0))):
        with Locations((-21, -18)):
            Circle(SKETCH_9_R)
        with Locations((21, -18)):
            Circle(SKETCH_9_R)
    extrude(amount=-CUT_EXTRUDE_6_DEPTH, mode=Mode.SUBTRACT)

    # 草图11 → 切除-拉伸8 (cut)
    with BuildSketch(Plane(origin=(0, 5, 0), x_dir=(1, 0, 0), z_dir=(0, 1, 0))):
        Polygon((-7.5, 0), (0, -6), (7.5, 0), align=None)
    extrude(amount=-CUT_EXTRUDE_8_DEPTH, mode=Mode.SUBTRACT)

    # 圆角1
    fillet_1_edges = [part.edges().sort_by_distance(p)[0] for p in [
        (-7.5, 2.5, 0),
        (7.5, 2.5, 0),
        (0, 2.5, 6),
    ]]
    fillet(fillet_1_edges, radius=FILLET_1_R)

    # 草图12 → 切除-拉伸9 (cut)
    with BuildSketch(Plane(origin=(0, 5, 0), x_dir=(1, 0, 0), z_dir=(0, 1, 0))):
        with Locations((0, -66)):
            Rectangle(SKETCH_12_W, SKETCH_12_H)
    extrude(amount=-CUT_EXTRUDE_9_DEPTH, mode=Mode.SUBTRACT)

    # 圆角2
    fillet_2_edges = [part.edges().sort_by_distance(p)[0] for p in [
        (-7.5, 2.5, 73),
        (-7.5, 2.5, 59),
        (7.5, 2.5, 59),
        (7.5, 2.5, 73),
    ]]
    fillet(fillet_2_edges, radius=FILLET_2_R)

    # 草图13 → 切除-拉伸10 (cut)
    with BuildSketch(Plane.XZ):
        with Locations((0, 76.25)):
            Rectangle(SKETCH_13_W, SKETCH_13_H)
    extrude(amount=-CUT_EXTRUDE_10_DEPTH, mode=Mode.SUBTRACT)

    # 圆角3
    fillet_3_edges = [part.edges().sort_by_distance(p)[0] for p in [
        (4, 2.5, 73),
        (-4, 2.5, 73),
        (-4, 2.5, 79.217902119),
        (4, 2.5, 79.217902119),
    ]]
    fillet(fillet_3_edges, radius=FILLET_3_R)

    # 草图14 → 切除-拉伸11 (cut)
    with BuildSketch(Plane.XZ):
        with Locations((-9, 75)):
            Circle(SKETCH_14_R)
        with Locations((9, 75)):
            Circle(SKETCH_14_R)
    extrude(amount=-CUT_EXTRUDE_11_DEPTH, mode=Mode.SUBTRACT)

    # 草图15 → 切除-拉伸12 (cut)
    with BuildSketch(Plane(origin=(0, 5, 0), x_dir=(1, 0, 0), z_dir=(0, 1, 0))):
        with Locations((0, -19.5)):
            Rectangle(SKETCH_15_W, SKETCH_15_H)
    extrude(amount=-CUT_EXTRUDE_12_DEPTH, mode=Mode.SUBTRACT)

    # 圆角4
    fillet_4_edges = [part.edges().sort_by_distance(p)[0] for p in [
        (-5, 2.5, 22),
        (-5, 2.5, 17),
        (5, 2.5, 17),
        (5, 2.5, 22),
    ]]
    fillet(fillet_4_edges, radius=FILLET_4_R)


solid = part.part
